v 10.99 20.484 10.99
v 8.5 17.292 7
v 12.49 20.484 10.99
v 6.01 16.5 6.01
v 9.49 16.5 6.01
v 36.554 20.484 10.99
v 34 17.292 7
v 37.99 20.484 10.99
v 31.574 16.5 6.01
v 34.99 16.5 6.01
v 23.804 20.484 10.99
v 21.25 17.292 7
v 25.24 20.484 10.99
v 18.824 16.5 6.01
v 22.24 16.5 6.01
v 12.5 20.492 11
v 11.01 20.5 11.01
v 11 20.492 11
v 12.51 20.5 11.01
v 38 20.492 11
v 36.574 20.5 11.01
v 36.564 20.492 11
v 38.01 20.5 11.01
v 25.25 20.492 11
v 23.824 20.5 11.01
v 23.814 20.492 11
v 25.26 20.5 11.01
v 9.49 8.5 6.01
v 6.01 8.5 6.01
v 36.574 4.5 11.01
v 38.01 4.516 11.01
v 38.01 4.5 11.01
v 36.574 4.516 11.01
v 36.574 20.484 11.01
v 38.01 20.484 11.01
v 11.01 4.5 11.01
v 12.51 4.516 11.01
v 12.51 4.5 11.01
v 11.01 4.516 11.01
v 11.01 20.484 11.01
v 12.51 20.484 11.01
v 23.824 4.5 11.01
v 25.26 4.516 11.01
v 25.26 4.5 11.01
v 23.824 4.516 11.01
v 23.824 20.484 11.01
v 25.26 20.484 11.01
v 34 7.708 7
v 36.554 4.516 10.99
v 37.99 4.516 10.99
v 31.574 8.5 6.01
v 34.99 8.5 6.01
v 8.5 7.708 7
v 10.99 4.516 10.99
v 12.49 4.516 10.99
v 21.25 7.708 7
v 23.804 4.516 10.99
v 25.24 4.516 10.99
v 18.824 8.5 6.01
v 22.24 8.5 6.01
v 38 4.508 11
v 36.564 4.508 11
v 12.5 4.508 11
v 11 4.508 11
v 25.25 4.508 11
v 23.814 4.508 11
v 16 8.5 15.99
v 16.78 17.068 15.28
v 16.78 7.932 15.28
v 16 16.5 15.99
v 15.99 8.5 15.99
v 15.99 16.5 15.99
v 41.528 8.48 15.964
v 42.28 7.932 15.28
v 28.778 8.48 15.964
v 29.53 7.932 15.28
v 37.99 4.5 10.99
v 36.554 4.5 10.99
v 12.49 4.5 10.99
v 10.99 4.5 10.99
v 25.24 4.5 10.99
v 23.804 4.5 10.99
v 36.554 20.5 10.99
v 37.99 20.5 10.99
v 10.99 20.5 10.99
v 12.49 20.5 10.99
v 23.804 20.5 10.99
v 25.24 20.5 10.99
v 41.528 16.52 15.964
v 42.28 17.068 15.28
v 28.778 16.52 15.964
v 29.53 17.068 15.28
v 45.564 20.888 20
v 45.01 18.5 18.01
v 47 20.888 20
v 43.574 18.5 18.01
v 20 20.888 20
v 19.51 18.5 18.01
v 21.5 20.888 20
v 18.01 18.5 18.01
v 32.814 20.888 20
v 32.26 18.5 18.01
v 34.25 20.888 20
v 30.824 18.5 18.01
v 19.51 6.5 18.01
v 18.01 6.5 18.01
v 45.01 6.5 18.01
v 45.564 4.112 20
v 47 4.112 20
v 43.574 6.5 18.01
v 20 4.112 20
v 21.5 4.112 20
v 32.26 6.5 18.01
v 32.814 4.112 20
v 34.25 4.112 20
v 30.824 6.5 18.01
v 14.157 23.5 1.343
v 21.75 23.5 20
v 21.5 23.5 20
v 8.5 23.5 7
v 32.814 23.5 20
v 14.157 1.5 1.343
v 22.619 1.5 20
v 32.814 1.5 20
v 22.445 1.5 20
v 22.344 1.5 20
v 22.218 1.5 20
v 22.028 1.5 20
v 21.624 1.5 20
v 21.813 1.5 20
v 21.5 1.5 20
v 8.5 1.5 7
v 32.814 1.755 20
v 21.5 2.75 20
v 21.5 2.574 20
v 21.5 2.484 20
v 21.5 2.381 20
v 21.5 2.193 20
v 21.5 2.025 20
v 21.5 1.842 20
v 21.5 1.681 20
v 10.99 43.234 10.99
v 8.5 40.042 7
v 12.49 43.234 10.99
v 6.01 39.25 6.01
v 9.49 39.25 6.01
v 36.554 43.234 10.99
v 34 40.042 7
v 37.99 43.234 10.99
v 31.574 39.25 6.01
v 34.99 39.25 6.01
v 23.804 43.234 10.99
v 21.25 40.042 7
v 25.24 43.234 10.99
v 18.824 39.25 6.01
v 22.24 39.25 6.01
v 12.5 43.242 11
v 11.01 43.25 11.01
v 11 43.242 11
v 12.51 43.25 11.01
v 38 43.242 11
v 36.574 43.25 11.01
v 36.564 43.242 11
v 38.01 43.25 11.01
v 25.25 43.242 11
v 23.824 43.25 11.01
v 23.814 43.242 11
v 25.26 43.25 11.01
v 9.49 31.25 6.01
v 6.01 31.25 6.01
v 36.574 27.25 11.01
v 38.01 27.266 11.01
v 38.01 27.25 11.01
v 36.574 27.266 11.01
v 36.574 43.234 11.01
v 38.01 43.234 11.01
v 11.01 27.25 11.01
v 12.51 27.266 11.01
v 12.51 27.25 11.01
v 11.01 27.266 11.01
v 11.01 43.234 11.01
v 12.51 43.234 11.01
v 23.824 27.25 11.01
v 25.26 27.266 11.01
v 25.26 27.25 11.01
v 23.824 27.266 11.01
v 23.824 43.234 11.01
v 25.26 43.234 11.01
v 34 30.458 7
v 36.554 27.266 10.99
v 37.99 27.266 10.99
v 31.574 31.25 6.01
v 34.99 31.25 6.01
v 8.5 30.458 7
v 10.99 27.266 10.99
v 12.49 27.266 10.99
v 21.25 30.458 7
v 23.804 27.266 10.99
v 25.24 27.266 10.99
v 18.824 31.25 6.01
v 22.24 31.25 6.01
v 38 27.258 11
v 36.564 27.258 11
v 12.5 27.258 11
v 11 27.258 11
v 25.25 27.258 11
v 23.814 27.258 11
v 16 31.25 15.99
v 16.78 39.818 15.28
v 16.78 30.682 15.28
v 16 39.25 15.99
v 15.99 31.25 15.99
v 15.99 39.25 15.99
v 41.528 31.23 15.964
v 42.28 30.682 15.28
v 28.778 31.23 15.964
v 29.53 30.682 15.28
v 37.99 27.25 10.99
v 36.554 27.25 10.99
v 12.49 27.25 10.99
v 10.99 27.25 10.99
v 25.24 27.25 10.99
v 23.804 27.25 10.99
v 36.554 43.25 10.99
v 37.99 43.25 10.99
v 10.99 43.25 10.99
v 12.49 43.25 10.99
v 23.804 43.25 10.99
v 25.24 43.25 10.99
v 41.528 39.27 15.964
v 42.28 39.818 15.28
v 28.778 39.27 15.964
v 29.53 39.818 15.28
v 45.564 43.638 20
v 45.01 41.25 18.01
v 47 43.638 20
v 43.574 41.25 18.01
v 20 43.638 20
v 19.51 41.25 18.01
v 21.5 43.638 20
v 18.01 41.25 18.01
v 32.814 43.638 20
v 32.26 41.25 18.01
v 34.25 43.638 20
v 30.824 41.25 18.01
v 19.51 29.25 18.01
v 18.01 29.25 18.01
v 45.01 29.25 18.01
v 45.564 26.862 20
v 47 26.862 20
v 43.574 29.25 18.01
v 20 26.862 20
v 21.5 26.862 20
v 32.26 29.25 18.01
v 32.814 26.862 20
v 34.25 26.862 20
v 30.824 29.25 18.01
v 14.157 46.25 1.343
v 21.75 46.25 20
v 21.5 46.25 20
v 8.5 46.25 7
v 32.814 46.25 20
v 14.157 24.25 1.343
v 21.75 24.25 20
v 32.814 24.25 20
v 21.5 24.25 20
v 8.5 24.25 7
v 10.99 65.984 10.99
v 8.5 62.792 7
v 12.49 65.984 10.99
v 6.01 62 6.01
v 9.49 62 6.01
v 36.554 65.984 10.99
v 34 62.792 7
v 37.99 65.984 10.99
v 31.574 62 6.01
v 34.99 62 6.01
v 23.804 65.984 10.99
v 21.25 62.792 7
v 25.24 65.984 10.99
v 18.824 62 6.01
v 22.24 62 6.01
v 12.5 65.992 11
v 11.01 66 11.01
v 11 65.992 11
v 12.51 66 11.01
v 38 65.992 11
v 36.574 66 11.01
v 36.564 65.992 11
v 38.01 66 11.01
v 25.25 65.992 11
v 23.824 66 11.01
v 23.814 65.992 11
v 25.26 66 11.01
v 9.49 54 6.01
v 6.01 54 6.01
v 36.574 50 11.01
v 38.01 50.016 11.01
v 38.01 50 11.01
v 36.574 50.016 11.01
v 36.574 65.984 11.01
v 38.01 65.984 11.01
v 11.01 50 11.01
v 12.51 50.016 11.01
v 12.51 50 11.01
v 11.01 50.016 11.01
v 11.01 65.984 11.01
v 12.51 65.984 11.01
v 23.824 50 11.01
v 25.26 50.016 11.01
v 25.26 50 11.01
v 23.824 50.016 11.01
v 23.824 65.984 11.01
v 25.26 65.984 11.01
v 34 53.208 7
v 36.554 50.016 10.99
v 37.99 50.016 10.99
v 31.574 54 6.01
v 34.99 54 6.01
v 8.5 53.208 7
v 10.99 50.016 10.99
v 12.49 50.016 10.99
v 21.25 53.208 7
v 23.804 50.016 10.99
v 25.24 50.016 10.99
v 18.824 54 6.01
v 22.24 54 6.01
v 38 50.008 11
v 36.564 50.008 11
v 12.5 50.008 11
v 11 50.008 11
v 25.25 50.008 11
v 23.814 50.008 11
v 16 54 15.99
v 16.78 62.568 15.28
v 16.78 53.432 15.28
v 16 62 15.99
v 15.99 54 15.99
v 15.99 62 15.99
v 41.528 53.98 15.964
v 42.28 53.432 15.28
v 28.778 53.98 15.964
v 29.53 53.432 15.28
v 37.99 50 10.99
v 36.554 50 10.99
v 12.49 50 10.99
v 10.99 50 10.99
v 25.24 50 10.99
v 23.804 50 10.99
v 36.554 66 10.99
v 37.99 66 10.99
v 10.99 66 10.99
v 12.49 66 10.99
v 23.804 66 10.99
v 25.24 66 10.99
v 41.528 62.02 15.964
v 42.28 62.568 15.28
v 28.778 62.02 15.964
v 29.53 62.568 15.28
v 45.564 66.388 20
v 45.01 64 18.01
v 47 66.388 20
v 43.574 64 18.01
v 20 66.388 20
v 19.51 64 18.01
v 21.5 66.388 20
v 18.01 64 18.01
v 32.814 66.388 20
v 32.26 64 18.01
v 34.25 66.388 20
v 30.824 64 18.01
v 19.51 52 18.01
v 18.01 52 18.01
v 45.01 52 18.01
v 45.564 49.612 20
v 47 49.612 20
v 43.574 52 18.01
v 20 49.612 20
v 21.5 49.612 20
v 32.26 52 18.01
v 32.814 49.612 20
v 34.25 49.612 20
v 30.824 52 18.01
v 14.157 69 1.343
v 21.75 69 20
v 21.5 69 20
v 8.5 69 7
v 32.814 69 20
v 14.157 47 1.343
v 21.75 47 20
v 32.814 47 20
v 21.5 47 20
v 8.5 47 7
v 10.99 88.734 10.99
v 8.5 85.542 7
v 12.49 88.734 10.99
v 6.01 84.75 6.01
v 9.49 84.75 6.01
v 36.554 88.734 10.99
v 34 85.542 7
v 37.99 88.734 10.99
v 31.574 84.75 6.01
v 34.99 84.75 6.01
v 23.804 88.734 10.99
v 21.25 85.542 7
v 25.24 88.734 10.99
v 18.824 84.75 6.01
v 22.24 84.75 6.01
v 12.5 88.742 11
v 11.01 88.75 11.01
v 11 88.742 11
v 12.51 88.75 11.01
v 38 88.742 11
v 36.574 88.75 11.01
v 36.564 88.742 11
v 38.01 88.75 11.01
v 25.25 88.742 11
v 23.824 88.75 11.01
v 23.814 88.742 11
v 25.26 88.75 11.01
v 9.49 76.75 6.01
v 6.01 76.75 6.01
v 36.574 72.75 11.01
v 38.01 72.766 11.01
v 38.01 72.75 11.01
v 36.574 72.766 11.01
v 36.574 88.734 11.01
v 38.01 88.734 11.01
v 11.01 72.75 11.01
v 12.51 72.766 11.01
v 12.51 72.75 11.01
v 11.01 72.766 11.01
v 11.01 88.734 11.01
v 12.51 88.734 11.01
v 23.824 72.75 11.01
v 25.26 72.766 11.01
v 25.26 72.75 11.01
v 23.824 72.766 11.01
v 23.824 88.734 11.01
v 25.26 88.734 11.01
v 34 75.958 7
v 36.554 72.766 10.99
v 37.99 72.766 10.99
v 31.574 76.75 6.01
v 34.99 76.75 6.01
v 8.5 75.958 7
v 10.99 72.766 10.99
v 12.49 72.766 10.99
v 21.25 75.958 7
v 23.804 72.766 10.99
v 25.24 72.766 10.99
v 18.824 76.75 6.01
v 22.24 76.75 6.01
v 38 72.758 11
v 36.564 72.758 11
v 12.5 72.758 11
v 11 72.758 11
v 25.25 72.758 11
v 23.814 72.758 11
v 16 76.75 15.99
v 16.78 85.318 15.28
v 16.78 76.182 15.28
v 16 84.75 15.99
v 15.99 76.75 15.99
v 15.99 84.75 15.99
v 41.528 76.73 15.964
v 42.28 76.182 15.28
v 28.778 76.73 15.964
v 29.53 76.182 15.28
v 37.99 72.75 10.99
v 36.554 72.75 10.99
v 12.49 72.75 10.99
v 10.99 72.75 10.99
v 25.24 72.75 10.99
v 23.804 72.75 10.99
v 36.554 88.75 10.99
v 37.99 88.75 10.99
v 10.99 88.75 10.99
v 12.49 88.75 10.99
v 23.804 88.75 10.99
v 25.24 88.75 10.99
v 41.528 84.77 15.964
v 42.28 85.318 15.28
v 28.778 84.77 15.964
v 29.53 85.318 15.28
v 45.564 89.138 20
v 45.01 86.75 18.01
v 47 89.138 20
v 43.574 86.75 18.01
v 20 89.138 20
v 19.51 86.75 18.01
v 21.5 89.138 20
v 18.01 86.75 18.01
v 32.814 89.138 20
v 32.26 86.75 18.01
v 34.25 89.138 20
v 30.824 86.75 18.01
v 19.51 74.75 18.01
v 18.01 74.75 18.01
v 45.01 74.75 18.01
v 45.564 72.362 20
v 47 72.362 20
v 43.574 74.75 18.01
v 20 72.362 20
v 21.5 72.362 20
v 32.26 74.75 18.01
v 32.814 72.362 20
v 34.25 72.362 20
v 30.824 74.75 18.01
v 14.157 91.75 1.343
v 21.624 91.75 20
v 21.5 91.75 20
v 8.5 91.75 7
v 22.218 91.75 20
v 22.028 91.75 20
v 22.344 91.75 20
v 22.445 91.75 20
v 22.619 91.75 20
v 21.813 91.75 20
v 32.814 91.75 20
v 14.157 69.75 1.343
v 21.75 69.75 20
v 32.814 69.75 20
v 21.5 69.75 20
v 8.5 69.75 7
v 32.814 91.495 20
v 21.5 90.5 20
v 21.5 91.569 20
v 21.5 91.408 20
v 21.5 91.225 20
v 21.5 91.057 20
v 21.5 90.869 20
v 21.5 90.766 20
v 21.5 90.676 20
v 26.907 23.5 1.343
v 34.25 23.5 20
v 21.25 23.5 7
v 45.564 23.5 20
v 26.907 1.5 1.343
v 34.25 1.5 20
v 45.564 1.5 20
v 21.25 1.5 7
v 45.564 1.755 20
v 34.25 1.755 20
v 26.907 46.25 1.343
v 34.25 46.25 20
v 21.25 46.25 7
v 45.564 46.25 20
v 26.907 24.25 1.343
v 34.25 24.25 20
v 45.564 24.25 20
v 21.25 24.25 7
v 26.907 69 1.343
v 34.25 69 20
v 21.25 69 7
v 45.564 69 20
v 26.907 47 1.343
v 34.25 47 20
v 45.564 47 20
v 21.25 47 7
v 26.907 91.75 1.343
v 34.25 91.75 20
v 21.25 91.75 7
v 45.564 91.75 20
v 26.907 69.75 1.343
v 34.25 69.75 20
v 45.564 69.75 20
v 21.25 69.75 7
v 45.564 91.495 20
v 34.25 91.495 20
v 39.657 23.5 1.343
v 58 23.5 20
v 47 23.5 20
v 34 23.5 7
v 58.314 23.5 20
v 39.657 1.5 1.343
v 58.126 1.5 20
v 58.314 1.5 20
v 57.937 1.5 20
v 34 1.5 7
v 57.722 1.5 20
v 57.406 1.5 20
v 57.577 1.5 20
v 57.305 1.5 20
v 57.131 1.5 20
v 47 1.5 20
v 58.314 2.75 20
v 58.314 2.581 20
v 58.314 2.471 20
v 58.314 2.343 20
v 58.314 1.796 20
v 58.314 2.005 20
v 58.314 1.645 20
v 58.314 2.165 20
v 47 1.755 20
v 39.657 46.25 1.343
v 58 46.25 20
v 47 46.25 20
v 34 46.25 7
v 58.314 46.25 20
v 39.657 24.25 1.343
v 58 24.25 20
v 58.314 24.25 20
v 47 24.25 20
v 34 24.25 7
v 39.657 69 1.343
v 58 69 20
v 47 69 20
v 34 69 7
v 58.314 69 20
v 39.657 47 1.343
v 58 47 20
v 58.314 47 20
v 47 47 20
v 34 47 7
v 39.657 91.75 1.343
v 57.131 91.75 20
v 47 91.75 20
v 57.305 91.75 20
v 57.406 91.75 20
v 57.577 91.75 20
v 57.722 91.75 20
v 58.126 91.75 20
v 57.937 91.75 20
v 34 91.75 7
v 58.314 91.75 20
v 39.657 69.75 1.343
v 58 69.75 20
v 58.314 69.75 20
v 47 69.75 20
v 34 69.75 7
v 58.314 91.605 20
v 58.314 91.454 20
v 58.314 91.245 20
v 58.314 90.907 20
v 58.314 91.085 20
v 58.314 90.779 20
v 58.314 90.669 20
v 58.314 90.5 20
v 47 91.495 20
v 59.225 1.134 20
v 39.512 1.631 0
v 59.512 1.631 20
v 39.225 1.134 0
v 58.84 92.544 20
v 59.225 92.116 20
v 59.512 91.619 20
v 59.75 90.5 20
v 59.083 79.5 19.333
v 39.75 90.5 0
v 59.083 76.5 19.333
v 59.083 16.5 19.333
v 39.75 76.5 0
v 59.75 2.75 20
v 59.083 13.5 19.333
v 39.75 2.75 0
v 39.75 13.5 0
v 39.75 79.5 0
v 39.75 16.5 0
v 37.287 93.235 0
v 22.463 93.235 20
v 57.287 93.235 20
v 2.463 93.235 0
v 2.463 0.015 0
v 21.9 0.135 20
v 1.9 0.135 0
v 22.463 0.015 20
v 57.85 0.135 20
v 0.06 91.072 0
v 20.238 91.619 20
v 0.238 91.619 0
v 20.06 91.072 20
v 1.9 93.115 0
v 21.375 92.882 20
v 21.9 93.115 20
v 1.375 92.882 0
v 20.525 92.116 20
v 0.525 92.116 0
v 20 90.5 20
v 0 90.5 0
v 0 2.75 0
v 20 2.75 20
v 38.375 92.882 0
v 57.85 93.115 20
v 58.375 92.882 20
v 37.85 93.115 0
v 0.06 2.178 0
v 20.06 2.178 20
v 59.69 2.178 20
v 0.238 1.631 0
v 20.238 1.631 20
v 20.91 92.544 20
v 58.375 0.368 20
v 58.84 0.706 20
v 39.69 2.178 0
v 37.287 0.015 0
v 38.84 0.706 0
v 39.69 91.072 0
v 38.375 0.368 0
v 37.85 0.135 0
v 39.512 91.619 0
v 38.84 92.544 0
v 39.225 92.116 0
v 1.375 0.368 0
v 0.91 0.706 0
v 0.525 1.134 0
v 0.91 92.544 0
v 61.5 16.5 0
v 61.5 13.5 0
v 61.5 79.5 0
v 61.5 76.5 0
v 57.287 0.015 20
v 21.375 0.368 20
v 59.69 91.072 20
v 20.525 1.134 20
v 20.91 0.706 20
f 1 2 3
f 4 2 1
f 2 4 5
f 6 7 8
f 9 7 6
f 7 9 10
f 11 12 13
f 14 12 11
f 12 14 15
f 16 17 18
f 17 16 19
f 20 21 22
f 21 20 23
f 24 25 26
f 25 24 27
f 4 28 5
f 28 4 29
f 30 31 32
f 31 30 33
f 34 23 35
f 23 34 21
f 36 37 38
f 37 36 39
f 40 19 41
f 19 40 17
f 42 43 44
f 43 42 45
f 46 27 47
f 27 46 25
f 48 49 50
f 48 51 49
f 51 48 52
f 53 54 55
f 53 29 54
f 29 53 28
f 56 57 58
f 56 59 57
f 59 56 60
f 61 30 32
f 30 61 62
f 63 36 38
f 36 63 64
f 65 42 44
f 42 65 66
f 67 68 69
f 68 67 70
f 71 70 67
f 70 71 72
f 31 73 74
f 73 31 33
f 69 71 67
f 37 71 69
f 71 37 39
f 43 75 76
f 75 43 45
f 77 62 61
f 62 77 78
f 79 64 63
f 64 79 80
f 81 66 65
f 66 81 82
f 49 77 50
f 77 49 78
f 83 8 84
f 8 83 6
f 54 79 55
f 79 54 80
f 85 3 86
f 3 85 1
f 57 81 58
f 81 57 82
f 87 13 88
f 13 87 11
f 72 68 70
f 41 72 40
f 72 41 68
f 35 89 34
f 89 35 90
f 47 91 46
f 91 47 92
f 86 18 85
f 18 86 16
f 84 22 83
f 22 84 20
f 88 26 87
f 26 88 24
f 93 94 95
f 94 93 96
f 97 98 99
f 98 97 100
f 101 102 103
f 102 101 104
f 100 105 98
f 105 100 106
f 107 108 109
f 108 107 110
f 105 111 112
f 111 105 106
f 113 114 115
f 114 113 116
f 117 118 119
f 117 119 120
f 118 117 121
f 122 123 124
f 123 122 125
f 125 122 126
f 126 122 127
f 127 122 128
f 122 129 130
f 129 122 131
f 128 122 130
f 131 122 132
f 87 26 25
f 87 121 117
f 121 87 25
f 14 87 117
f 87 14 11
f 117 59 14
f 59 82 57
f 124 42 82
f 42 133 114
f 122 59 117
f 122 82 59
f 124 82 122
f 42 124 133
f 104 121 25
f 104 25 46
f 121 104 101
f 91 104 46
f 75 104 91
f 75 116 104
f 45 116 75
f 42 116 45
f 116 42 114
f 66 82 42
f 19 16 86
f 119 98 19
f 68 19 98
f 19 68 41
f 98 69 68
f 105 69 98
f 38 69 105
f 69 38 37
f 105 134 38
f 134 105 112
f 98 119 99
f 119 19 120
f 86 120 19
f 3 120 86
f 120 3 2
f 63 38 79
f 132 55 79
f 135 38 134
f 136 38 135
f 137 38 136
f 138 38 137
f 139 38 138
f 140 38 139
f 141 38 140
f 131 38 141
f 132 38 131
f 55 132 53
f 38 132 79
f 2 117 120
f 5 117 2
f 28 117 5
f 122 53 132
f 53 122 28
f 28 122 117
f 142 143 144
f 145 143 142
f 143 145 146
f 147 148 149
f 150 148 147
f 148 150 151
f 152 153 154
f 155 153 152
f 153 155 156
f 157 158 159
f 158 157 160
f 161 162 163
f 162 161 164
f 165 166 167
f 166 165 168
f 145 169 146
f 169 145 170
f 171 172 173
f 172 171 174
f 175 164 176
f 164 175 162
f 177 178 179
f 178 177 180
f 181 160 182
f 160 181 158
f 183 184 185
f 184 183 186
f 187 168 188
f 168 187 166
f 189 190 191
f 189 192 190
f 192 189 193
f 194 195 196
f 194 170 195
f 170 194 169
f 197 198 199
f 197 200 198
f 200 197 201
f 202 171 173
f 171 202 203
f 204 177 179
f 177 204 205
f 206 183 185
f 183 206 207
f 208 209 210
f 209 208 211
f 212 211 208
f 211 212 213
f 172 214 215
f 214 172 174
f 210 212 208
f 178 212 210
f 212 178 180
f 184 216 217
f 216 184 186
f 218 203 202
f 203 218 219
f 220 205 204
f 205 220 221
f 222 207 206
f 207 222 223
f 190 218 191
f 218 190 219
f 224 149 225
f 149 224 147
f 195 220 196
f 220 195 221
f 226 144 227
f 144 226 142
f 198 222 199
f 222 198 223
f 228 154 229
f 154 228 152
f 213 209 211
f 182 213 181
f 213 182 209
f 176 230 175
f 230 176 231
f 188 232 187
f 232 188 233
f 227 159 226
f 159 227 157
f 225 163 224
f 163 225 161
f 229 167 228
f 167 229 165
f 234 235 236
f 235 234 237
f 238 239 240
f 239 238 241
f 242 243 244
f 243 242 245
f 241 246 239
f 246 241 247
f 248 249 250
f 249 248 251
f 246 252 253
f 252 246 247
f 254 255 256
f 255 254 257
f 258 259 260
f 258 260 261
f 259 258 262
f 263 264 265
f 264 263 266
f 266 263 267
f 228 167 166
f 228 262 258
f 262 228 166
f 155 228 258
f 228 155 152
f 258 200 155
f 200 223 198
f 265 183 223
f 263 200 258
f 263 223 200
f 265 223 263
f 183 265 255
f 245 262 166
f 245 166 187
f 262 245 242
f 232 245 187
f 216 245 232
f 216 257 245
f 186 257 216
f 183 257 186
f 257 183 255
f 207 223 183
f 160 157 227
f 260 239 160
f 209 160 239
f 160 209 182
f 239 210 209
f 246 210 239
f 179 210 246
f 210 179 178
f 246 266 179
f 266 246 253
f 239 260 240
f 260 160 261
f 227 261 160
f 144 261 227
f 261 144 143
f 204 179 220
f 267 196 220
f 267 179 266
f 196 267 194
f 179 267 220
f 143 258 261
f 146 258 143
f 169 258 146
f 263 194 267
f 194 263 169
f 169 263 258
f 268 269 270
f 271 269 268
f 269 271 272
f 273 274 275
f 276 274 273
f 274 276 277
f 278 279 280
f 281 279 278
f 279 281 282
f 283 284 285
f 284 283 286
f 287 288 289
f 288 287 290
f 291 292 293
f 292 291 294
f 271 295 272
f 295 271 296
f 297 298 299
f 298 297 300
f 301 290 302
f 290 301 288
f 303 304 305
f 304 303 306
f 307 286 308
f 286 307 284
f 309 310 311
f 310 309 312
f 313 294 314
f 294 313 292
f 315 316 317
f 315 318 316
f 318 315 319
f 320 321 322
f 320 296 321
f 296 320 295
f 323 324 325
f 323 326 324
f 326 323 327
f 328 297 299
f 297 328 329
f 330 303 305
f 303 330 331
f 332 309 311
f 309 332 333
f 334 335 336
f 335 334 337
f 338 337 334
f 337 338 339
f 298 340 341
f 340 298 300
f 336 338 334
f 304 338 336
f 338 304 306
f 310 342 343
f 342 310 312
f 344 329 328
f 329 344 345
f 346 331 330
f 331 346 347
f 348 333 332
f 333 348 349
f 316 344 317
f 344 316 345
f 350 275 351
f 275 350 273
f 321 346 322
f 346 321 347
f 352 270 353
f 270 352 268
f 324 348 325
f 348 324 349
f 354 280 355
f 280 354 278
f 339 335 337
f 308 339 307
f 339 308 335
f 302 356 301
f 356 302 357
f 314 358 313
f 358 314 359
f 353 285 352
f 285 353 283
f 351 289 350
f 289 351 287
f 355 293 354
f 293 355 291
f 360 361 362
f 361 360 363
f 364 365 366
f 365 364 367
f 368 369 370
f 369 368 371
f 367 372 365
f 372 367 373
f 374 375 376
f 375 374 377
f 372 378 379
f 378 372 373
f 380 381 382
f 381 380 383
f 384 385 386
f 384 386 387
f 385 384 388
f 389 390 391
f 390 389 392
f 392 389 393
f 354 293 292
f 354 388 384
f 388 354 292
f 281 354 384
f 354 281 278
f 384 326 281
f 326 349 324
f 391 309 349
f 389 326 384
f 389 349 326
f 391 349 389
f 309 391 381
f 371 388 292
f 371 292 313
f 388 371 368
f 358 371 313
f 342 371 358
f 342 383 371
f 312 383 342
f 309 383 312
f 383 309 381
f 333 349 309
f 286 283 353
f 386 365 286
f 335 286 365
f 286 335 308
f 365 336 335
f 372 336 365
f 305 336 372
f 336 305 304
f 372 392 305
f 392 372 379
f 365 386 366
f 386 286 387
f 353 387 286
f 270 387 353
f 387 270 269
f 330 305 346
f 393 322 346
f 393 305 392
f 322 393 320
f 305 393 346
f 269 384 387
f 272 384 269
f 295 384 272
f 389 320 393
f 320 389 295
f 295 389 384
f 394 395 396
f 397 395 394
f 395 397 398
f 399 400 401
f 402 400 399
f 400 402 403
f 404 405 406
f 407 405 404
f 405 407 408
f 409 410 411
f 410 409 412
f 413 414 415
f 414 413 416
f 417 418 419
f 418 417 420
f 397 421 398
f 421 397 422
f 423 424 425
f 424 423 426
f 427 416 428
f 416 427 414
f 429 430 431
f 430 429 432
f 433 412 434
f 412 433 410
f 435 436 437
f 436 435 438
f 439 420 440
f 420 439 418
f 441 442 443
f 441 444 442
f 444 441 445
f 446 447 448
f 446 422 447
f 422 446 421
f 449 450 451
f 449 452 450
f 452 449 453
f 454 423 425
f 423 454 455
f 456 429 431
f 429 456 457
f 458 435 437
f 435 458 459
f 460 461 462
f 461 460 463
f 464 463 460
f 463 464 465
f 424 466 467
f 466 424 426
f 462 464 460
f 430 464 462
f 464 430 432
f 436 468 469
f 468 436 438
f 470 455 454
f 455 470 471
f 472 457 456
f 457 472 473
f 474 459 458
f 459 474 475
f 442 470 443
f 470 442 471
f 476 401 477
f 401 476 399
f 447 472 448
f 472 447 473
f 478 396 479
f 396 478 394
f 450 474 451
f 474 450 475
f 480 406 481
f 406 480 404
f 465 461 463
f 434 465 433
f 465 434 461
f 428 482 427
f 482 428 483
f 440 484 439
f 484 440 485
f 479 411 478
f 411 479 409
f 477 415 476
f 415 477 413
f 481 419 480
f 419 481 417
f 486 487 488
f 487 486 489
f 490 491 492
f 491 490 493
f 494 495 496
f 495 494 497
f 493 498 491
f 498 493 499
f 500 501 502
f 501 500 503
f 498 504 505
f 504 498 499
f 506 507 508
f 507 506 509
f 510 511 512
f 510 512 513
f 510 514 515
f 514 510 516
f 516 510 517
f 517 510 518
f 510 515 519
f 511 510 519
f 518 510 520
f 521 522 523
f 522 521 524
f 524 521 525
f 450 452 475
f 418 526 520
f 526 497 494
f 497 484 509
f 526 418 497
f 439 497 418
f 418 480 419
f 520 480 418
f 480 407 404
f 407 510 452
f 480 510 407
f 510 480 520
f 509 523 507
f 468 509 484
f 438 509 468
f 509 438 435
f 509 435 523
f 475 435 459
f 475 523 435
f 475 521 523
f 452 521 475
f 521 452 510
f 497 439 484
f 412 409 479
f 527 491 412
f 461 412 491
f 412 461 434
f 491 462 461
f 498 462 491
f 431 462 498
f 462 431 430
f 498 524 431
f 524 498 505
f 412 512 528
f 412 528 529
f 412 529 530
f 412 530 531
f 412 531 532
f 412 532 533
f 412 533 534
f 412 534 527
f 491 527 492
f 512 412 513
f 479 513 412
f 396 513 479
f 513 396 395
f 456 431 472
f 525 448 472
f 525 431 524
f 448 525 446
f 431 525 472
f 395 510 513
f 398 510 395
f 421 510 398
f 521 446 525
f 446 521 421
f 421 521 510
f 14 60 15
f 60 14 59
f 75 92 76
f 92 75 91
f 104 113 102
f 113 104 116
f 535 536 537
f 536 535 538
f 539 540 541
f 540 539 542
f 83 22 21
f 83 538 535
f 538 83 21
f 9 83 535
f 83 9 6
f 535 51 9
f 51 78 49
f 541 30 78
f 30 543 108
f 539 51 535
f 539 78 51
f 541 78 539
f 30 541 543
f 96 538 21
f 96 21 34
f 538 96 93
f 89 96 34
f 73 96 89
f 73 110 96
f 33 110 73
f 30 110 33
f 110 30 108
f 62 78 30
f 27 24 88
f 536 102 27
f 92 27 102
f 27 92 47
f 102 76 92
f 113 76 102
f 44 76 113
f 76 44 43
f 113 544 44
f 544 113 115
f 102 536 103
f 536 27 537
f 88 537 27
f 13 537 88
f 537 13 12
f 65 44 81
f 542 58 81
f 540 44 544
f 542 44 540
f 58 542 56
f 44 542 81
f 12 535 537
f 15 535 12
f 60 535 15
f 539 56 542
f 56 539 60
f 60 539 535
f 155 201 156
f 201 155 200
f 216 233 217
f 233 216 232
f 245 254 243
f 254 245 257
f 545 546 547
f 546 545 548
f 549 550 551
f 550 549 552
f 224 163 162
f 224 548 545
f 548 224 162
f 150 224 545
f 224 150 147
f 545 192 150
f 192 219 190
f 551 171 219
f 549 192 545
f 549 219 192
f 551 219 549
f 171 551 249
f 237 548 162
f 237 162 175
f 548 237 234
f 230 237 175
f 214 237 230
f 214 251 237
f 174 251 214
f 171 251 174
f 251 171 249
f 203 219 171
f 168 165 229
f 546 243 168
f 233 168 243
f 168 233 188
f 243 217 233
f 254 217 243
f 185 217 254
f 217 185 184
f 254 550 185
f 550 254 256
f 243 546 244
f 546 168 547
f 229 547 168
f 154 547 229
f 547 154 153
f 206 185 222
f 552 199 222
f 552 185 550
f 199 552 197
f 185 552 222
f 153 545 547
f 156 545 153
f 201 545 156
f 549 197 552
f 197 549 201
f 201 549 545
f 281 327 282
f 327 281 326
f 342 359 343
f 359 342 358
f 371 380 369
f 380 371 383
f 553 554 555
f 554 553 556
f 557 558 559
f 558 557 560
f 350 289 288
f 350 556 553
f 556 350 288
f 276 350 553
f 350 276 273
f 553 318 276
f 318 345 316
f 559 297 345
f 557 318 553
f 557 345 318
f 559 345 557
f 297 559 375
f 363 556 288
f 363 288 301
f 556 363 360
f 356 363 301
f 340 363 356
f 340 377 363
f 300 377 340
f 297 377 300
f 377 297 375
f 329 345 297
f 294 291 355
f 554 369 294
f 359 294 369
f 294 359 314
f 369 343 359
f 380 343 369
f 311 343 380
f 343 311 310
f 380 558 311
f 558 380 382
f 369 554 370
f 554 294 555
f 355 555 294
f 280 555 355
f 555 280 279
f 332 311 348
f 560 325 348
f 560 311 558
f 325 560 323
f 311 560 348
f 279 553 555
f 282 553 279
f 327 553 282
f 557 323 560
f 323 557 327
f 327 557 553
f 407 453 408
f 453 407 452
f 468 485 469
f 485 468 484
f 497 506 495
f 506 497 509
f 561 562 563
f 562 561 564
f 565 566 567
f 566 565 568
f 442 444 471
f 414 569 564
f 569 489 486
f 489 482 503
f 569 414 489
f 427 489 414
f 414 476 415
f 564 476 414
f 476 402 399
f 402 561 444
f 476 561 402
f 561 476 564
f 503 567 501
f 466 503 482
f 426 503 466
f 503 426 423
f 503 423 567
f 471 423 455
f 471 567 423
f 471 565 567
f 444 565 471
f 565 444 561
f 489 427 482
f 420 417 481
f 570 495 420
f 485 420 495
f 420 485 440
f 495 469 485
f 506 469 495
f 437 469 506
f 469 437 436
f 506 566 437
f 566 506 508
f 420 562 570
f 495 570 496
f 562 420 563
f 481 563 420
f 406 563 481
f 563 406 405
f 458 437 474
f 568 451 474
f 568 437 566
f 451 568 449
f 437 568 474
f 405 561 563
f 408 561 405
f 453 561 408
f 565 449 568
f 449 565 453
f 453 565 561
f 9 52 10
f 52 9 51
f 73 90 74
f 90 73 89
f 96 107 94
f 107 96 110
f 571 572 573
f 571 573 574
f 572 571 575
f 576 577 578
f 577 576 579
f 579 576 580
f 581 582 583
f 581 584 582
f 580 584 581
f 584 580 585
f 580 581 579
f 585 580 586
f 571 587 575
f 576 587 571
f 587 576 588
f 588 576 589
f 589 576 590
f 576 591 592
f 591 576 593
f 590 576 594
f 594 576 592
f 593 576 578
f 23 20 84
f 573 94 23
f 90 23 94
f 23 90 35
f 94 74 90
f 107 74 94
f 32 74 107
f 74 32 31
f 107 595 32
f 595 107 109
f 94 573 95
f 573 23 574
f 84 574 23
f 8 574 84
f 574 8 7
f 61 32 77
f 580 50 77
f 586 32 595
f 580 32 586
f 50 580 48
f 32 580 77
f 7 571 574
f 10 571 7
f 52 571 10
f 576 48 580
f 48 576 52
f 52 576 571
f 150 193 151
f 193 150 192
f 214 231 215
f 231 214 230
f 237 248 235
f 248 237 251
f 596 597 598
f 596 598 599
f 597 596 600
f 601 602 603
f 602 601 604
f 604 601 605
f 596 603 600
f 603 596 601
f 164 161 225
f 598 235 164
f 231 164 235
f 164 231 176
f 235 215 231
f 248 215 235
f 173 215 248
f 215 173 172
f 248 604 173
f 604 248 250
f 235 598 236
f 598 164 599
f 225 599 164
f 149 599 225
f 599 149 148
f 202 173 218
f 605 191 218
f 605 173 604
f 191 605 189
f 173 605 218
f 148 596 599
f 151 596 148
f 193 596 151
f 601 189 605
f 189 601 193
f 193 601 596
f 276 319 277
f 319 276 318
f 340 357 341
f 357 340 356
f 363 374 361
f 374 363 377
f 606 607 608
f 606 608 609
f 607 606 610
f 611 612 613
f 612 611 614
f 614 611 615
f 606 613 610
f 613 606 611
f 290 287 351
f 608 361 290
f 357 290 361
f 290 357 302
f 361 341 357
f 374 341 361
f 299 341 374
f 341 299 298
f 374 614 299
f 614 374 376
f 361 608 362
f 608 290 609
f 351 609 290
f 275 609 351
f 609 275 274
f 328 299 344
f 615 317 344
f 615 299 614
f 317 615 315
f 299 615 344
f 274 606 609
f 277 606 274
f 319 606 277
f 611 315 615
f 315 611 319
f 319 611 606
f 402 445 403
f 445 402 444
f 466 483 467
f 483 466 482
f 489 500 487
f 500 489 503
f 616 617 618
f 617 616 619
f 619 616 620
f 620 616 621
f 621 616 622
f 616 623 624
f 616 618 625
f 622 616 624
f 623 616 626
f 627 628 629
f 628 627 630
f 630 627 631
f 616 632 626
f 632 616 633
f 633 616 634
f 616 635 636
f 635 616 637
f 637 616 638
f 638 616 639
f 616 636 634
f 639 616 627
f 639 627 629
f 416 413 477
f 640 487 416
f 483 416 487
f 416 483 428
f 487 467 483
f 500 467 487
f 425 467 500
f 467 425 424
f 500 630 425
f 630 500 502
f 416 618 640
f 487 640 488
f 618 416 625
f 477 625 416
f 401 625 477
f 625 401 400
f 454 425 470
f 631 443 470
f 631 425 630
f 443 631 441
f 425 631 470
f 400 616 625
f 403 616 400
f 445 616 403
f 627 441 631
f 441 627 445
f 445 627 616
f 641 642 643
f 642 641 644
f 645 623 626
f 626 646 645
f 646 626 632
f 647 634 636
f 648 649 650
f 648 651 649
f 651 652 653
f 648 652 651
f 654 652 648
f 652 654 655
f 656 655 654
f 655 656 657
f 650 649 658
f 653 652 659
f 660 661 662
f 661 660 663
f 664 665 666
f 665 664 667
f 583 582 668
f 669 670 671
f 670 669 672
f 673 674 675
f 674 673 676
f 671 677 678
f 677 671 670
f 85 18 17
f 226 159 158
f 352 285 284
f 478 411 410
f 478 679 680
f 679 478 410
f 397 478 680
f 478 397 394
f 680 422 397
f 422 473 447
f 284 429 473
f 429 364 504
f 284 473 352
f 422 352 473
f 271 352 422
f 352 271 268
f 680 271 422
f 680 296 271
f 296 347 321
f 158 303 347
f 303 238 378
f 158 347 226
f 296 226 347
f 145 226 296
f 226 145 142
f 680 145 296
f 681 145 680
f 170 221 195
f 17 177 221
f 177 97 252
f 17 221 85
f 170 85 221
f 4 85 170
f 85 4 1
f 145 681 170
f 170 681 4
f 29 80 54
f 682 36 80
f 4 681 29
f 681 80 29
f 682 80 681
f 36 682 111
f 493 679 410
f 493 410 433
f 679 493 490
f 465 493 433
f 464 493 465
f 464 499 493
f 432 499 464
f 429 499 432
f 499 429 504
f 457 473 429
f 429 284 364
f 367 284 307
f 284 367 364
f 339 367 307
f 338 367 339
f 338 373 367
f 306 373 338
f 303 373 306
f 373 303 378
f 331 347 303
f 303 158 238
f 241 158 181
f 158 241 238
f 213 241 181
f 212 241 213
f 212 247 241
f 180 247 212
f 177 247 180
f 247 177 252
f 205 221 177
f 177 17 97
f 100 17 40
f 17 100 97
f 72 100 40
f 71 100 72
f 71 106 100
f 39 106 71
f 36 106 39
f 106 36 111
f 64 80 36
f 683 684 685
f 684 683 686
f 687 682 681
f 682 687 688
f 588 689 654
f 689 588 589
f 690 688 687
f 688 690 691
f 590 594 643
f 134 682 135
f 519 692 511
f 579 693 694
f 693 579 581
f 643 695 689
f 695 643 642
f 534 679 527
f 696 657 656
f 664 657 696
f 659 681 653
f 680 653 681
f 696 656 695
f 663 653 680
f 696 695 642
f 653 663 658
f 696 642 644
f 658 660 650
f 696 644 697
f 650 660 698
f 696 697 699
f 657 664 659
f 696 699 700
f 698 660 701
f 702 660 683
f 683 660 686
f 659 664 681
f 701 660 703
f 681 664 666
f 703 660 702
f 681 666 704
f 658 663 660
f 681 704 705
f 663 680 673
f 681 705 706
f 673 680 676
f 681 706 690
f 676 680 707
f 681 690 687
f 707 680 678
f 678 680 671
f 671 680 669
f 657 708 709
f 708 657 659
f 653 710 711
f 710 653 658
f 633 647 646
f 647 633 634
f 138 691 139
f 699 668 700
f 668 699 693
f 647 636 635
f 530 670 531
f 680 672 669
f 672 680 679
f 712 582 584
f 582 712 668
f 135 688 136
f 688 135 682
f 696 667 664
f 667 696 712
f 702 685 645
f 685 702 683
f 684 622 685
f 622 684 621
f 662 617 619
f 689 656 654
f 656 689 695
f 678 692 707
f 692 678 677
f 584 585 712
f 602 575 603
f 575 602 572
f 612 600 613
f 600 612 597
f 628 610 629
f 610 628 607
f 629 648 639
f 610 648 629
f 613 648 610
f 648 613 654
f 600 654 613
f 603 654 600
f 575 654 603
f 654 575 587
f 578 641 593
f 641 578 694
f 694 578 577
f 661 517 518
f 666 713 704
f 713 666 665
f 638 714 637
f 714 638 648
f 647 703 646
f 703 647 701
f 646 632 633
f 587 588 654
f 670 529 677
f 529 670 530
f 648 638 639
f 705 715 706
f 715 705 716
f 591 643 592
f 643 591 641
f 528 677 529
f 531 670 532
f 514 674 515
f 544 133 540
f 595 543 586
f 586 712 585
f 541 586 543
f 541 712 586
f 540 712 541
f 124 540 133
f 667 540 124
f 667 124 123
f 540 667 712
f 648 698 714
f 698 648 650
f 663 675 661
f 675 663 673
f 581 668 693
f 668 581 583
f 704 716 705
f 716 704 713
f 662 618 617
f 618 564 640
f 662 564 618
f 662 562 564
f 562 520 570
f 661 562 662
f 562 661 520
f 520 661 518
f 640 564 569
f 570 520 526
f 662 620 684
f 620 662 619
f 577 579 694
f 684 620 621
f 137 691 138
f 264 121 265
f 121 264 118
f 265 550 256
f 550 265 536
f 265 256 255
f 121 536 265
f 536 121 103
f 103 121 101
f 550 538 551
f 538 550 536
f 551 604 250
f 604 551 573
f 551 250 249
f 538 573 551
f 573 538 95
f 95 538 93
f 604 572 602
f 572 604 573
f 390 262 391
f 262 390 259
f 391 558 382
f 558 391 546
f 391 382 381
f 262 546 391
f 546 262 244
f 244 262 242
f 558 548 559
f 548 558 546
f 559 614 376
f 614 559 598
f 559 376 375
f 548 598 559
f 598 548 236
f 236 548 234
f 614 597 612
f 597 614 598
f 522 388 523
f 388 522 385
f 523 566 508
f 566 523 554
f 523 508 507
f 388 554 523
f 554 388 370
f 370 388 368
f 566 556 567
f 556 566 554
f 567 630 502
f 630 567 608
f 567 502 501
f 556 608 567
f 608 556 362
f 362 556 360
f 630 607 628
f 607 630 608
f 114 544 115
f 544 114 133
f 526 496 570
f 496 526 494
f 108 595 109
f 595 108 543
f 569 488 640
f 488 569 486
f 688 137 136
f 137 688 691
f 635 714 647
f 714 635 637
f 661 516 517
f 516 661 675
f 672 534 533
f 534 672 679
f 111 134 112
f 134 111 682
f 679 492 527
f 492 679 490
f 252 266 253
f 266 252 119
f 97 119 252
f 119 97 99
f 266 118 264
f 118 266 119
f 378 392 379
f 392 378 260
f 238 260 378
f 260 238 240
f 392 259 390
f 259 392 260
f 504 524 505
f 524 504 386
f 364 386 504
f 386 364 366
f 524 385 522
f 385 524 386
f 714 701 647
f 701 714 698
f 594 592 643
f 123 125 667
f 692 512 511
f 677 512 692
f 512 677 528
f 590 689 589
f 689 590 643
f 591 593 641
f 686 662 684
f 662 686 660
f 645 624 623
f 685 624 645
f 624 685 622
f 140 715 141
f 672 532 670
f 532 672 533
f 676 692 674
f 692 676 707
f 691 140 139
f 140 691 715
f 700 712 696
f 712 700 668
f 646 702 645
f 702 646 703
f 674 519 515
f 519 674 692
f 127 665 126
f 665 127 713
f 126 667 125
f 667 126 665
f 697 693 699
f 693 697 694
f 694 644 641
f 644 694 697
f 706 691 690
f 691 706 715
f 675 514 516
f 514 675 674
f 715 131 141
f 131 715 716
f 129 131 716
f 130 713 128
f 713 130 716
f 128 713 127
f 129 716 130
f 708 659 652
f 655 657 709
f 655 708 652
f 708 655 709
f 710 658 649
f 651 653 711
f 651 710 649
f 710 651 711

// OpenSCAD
AMOUNT_X = 3;
AMOUNT_Y = 4;

/* [Edges] */
INNER_EDGE = 0.75;
OUTER_EDGE_PADDING = 0.75;
OUTER_RADIUS_EMBEDDING = 2;
SLANT_EDGE_PADDING = 0.75;

/* [Gap Size] */
GAP_WIDTH = 22;

/* [Hidden] */
// Perhaps calculate these
SLANT_FULL_HEIGHT = 20;
SLANT_GAP_OFFSET = 7;
SLANT_GAP_WIDTH = 11.25;
SLANT_GAP_WIDTH_INNER = 8;

module casing_rod(total_radius, pos) {
    translate(pos)
    cylinder(0.00001, total_radius, true);
    
    translate(pos + [SLANT_FULL_HEIGHT, 0, SLANT_FULL_HEIGHT])
    cylinder(0.00001, total_radius, true);
}

module casing(depth, width) {
    total_radius = OUTER_EDGE_PADDING + OUTER_RADIUS_EMBEDDING;
    
    width_inner = width;
    width_start = total_radius;
    width_end = width_inner + total_radius - OUTER_RADIUS_EMBEDDING*2;
    
    depth_inner = depth;
    depth_start = total_radius;
    depth_end = depth_inner + total_radius - OUTER_RADIUS_EMBEDDING*2;
    
    $fn = 30;
    hull() {
        casing_rod(total_radius, [depth_start, width_start, 0]);
        casing_rod(total_radius, [depth_start, width_end, 0]);
        
        casing_rod(total_radius, [depth_end, width_start, 0]);
        casing_rod(total_radius, [depth_end, width_end, 0]);
    }
}

module gap_detail_half() {
    translate([0, 0, -2.49])
        linear_extrude(5, scale=2, center=true)
        square([11, 8], true);
}

module gap_detail() {
    gap_detail_half();
    
    mirror([0, 0, 1])
        gap_detail_half();
    
    translate([8, 0, 12])
    scale([1, 1.5, 1])
        gap_detail_half();
}

module gap() {
    rotate(a = 45, v = [0, 1, 0])
        cube([SLANT_GAP_WIDTH_INNER, GAP_WIDTH, 40]);
    
    translate([2, GAP_WIDTH*0.5, 4])
        gap_detail();
}

module gaps() {
    translate([
        SLANT_GAP_OFFSET + OUTER_EDGE_PADDING + INNER_EDGE,
        OUTER_EDGE_PADDING + INNER_EDGE,
        SLANT_GAP_OFFSET
    ])
    for (x = [0:AMOUNT_X-1])
    for (y = [0:AMOUNT_Y-1])
        translate([
            (SLANT_GAP_WIDTH + INNER_EDGE + SLANT_EDGE_PADDING)*x,
            (GAP_WIDTH + INNER_EDGE)*y,
            0
        ])
        gap();
}

module main_case() {
    difference() {
        casing(
            INNER_EDGE +
            (SLANT_GAP_WIDTH + INNER_EDGE + SLANT_EDGE_PADDING)*AMOUNT_X
            - SLANT_EDGE_PADDING,
        
            INNER_EDGE +
            (GAP_WIDTH + INNER_EDGE) * AMOUNT_Y
            
        );
        gaps();
    }
}

module stand_2d() {
    size = SLANT_FULL_HEIGHT*0.75;
    
    polygon(points=[
        [0, 0],
        [1.5*size, 0],
        [SLANT_FULL_HEIGHT, SLANT_FULL_HEIGHT]
    ]);
}

module stand(offse) {
    translate([39, offse, 0])
    rotate(a = 90, v = [1, 0, 0])
        linear_extrude(3, center = true)
        stand_2d();
}

// Finally, the combined model
main_case();
stand(15);
stand(93-15);
